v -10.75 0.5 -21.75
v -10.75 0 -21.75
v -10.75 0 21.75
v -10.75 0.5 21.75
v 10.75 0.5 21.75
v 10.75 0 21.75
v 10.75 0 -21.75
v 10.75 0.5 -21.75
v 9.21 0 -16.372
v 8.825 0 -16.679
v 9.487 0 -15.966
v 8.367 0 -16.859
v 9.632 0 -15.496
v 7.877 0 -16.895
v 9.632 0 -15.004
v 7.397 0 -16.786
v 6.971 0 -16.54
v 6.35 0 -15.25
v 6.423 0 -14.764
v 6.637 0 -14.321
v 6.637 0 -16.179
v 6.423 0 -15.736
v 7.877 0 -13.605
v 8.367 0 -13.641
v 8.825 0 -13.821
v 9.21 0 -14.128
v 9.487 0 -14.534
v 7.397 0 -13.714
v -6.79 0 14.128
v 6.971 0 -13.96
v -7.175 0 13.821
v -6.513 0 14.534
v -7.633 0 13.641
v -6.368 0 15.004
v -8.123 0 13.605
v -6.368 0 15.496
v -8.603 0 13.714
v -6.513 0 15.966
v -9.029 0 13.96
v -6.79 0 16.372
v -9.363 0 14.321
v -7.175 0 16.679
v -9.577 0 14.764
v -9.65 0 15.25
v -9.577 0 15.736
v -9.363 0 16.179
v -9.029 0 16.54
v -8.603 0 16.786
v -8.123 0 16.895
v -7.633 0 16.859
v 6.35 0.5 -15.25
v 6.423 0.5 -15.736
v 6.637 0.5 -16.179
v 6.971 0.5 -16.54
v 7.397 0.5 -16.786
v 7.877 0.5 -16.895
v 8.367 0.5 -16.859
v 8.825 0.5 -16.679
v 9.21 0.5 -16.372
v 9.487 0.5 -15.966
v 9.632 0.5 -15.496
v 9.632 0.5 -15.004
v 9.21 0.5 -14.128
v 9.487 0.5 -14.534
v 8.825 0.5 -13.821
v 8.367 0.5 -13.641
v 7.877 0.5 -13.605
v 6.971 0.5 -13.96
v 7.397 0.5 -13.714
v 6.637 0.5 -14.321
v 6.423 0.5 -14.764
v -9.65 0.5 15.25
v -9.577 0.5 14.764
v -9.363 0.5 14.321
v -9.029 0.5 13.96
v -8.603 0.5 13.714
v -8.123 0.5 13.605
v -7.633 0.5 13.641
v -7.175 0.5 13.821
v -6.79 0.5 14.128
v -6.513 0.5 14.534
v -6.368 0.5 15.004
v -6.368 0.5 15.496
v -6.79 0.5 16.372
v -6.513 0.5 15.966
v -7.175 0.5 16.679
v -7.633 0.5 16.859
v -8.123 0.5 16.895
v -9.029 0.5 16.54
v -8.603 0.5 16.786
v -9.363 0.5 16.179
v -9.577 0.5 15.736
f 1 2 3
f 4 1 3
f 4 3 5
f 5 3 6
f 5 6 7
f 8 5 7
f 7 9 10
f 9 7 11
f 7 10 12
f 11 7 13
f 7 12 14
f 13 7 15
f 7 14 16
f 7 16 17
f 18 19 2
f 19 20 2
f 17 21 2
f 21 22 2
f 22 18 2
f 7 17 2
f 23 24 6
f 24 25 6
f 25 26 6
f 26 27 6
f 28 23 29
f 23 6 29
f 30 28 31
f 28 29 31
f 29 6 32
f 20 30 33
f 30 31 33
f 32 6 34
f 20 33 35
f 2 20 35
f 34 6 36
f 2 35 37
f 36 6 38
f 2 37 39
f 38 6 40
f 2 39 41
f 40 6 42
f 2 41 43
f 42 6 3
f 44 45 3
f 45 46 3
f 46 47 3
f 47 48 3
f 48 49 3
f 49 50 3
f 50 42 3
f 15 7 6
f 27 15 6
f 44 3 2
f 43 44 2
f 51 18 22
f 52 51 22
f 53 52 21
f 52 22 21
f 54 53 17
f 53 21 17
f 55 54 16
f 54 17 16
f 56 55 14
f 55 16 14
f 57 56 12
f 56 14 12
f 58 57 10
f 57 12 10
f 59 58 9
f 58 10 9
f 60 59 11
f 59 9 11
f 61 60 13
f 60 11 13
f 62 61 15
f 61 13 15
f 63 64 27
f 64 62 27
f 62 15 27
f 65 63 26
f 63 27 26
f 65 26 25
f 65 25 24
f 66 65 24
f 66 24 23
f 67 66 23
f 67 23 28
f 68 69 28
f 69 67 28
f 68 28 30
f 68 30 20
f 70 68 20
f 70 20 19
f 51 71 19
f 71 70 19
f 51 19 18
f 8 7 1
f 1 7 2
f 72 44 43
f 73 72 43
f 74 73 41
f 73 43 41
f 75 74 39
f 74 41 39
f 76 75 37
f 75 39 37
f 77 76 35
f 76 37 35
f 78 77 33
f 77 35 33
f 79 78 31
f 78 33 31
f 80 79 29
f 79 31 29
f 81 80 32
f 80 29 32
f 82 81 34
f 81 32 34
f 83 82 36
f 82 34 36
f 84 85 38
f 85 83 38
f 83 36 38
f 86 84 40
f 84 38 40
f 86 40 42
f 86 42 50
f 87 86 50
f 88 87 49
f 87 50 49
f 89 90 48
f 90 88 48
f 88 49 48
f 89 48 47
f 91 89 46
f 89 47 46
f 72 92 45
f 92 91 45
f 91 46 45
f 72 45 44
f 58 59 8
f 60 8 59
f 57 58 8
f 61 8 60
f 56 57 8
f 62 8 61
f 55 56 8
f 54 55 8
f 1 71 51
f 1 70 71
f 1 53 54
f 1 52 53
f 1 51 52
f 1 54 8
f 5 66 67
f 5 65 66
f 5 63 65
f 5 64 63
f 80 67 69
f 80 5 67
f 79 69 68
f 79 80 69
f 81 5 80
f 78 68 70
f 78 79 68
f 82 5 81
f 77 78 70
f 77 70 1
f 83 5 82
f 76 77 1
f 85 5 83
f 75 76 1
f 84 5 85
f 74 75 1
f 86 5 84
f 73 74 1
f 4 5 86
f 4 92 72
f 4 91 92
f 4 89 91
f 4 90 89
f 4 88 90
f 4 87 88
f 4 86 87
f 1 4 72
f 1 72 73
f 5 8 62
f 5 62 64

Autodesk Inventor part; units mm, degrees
ref_plane "YZ Plane" through (0, 0, 0) normal (1, 0, 0) x (0, 1, 0)
ref_plane "XZ Plane" through (0, 0, 0) normal (0, 1, 0) x (-1, 0, 0)
ref_plane "XY Plane" through (0, 0, 0) normal (0, 0, 1) x (1, 0, 0)
sketch "Sketch1" plane through (0, 0, 0) normal (0, 1, 0) x (-1, 0, 0)
  line L0 (10.75, 21.75) -> (-10.75, 21.75)
  line L1 (-10.75, 21.75) -> (-10.75, -21.75)
  line L2 (-10.75, -21.75) -> (10.75, -21.75)
  line L3 (10.75, -21.75) -> (10.75, 21.75)
  line L4 (10.75, 21.75) -> (-10.75, -21.75) construction
  line L5 (-10.75, 21.75) -> (10.75, -21.75) construction
  line L6 (8, -15.25) -> (-8, -15.25) construction
  line L7 (-8, -15.25) -> (-8, 15.25) construction
  line L8 (-8, 15.25) -> (8, 15.25) construction
  line L9 (8, 15.25) -> (8, -15.25) construction
  line L10 (8, -15.25) -> (-8, 15.25) construction
  line L11 (-8, -15.25) -> (8, 15.25) construction
  circle A0 centre (8, 15.25) radius 1.65
  circle A1 centre (-8, -15.25) radius 1.65
  point P0 (0, 0)
  dimension "d0" = 21.5
  dimension "d1" = 43.5
  dimension "d2" = 16
  dimension "d3" = 30.5
  dimension "d4" = 3.3
  dimension "d5" = 3.3
extrude "Extrusion1" add sketch "Sketch1" along normal blind 0.5
